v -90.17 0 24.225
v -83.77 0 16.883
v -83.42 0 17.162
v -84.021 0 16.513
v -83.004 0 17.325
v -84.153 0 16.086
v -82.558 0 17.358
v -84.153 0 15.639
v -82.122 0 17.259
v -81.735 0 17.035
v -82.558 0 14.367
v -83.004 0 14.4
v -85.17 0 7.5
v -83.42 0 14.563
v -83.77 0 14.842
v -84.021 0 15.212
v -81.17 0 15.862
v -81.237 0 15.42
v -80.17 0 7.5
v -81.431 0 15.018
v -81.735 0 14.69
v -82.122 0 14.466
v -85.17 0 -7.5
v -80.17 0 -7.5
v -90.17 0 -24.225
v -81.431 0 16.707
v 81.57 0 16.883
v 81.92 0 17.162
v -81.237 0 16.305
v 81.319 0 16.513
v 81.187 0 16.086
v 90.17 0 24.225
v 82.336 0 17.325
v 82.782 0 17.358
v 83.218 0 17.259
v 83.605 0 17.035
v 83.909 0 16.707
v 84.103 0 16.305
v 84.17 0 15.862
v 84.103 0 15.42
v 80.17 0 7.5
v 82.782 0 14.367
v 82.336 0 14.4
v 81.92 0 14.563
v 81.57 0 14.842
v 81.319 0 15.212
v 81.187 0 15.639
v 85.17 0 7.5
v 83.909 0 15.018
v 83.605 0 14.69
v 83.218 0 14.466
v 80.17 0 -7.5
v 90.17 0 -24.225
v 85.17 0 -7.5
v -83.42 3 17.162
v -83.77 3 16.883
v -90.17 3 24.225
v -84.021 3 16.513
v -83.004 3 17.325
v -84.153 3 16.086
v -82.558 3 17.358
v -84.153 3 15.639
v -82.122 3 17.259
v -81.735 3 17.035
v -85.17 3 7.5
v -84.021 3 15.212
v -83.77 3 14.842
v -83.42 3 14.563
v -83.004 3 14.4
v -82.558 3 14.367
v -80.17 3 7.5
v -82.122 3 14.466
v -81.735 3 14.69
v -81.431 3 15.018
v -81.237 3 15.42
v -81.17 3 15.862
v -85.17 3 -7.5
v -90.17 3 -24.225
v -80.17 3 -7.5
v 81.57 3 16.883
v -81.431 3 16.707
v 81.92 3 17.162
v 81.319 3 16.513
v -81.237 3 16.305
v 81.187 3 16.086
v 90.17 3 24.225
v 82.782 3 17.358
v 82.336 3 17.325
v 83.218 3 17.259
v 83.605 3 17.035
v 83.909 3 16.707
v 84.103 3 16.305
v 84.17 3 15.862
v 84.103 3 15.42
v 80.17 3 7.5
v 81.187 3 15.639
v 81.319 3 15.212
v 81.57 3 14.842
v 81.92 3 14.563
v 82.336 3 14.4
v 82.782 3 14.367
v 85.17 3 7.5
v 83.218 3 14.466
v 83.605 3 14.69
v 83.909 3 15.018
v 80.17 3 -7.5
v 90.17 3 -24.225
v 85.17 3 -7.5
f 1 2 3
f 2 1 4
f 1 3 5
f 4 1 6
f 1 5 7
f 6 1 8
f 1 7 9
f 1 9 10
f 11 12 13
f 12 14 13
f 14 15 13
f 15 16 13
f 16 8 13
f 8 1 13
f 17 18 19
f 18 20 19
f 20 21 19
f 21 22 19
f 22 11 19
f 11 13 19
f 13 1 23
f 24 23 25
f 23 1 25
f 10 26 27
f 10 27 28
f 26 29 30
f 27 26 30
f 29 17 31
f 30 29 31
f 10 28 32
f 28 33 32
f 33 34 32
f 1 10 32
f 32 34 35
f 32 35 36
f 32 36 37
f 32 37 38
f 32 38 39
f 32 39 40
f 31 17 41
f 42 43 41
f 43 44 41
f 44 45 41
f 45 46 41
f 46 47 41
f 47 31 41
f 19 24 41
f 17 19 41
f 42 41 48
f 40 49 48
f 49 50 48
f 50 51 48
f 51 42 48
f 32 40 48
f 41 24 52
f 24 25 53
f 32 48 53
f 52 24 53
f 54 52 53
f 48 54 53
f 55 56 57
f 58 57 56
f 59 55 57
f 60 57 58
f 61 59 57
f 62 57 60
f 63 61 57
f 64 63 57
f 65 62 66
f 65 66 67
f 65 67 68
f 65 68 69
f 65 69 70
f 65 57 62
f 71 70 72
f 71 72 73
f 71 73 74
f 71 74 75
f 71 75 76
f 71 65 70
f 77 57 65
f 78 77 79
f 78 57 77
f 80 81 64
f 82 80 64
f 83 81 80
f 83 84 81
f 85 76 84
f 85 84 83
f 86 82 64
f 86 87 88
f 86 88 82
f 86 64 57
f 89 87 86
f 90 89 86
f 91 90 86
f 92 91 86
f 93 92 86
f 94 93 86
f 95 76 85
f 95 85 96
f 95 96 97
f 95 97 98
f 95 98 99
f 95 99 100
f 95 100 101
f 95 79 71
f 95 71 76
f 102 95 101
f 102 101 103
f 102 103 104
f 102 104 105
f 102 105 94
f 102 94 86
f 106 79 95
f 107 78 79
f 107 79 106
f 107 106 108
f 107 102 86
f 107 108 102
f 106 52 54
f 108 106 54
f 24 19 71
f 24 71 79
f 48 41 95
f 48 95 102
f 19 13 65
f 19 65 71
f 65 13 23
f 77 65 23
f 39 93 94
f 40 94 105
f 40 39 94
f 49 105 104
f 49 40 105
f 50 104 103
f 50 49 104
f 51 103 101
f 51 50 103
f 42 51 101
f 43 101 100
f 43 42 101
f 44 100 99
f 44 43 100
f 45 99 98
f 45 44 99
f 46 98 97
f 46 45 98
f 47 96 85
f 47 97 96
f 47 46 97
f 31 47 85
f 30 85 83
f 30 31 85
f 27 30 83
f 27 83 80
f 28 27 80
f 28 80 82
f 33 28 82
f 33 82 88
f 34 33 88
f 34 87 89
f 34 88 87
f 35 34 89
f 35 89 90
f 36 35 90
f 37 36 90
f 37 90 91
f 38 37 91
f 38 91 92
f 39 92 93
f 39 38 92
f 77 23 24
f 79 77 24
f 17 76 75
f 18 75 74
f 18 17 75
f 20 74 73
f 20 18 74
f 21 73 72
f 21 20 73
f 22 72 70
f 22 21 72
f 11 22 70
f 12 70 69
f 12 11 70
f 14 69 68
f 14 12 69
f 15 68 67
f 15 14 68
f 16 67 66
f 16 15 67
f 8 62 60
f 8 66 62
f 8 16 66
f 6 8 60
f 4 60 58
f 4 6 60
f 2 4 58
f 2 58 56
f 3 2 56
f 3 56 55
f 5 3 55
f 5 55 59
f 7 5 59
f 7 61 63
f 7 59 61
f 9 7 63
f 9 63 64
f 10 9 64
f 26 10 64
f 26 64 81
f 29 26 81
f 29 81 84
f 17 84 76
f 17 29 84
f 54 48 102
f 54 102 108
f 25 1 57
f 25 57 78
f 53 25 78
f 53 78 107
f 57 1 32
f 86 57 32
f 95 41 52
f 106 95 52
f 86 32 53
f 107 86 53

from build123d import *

# Parameters (mm, degrees)
SCHIZZO1_W                   = 180.34
SCHIZZO1_H                   = 48.45
ESTRUSIONE_ESTRUSIONE1_DEPTH = 3
SCHIZZO2_R                   = 1.5
SCHIZZO2_W                   = 5
SCHIZZO2_H                   = 15
TAGLIO_ESTRUSIONE1_DEPTH     = 4


with BuildPart() as part:
    # Schizzo1 → Estrusione-Estrusione1 (new body)
    with BuildSketch(Plane(origin=(0, 0, 0), x_dir=(1, 0, 0), z_dir=(0, 1, 0))):
        Rectangle(SCHIZZO1_W, SCHIZZO1_H)
    extrude(amount=ESTRUSIONE_ESTRUSIONE1_DEPTH)

    # Schizzo2 → Taglio-Estrusione1 (cut, through all)
    with BuildSketch(Plane(origin=(0, 0, 0), x_dir=(1, 0, 0), z_dir=(0, 1, 0))):
        with Locations((-82.67, -15.8625)):
            Circle(SCHIZZO2_R)
        with Locations((82.67, -15.8625)):
            Circle(SCHIZZO2_R)
        with Locations((-82.67, 0)):
            Rectangle(SCHIZZO2_W, SCHIZZO2_H)
        with Locations((82.67, 0)):
            Rectangle(SCHIZZO2_W, SCHIZZO2_H)
    extrude(amount=TAGLIO_ESTRUSIONE1_DEPTH, mode=Mode.SUBTRACT)


solid = part.part
